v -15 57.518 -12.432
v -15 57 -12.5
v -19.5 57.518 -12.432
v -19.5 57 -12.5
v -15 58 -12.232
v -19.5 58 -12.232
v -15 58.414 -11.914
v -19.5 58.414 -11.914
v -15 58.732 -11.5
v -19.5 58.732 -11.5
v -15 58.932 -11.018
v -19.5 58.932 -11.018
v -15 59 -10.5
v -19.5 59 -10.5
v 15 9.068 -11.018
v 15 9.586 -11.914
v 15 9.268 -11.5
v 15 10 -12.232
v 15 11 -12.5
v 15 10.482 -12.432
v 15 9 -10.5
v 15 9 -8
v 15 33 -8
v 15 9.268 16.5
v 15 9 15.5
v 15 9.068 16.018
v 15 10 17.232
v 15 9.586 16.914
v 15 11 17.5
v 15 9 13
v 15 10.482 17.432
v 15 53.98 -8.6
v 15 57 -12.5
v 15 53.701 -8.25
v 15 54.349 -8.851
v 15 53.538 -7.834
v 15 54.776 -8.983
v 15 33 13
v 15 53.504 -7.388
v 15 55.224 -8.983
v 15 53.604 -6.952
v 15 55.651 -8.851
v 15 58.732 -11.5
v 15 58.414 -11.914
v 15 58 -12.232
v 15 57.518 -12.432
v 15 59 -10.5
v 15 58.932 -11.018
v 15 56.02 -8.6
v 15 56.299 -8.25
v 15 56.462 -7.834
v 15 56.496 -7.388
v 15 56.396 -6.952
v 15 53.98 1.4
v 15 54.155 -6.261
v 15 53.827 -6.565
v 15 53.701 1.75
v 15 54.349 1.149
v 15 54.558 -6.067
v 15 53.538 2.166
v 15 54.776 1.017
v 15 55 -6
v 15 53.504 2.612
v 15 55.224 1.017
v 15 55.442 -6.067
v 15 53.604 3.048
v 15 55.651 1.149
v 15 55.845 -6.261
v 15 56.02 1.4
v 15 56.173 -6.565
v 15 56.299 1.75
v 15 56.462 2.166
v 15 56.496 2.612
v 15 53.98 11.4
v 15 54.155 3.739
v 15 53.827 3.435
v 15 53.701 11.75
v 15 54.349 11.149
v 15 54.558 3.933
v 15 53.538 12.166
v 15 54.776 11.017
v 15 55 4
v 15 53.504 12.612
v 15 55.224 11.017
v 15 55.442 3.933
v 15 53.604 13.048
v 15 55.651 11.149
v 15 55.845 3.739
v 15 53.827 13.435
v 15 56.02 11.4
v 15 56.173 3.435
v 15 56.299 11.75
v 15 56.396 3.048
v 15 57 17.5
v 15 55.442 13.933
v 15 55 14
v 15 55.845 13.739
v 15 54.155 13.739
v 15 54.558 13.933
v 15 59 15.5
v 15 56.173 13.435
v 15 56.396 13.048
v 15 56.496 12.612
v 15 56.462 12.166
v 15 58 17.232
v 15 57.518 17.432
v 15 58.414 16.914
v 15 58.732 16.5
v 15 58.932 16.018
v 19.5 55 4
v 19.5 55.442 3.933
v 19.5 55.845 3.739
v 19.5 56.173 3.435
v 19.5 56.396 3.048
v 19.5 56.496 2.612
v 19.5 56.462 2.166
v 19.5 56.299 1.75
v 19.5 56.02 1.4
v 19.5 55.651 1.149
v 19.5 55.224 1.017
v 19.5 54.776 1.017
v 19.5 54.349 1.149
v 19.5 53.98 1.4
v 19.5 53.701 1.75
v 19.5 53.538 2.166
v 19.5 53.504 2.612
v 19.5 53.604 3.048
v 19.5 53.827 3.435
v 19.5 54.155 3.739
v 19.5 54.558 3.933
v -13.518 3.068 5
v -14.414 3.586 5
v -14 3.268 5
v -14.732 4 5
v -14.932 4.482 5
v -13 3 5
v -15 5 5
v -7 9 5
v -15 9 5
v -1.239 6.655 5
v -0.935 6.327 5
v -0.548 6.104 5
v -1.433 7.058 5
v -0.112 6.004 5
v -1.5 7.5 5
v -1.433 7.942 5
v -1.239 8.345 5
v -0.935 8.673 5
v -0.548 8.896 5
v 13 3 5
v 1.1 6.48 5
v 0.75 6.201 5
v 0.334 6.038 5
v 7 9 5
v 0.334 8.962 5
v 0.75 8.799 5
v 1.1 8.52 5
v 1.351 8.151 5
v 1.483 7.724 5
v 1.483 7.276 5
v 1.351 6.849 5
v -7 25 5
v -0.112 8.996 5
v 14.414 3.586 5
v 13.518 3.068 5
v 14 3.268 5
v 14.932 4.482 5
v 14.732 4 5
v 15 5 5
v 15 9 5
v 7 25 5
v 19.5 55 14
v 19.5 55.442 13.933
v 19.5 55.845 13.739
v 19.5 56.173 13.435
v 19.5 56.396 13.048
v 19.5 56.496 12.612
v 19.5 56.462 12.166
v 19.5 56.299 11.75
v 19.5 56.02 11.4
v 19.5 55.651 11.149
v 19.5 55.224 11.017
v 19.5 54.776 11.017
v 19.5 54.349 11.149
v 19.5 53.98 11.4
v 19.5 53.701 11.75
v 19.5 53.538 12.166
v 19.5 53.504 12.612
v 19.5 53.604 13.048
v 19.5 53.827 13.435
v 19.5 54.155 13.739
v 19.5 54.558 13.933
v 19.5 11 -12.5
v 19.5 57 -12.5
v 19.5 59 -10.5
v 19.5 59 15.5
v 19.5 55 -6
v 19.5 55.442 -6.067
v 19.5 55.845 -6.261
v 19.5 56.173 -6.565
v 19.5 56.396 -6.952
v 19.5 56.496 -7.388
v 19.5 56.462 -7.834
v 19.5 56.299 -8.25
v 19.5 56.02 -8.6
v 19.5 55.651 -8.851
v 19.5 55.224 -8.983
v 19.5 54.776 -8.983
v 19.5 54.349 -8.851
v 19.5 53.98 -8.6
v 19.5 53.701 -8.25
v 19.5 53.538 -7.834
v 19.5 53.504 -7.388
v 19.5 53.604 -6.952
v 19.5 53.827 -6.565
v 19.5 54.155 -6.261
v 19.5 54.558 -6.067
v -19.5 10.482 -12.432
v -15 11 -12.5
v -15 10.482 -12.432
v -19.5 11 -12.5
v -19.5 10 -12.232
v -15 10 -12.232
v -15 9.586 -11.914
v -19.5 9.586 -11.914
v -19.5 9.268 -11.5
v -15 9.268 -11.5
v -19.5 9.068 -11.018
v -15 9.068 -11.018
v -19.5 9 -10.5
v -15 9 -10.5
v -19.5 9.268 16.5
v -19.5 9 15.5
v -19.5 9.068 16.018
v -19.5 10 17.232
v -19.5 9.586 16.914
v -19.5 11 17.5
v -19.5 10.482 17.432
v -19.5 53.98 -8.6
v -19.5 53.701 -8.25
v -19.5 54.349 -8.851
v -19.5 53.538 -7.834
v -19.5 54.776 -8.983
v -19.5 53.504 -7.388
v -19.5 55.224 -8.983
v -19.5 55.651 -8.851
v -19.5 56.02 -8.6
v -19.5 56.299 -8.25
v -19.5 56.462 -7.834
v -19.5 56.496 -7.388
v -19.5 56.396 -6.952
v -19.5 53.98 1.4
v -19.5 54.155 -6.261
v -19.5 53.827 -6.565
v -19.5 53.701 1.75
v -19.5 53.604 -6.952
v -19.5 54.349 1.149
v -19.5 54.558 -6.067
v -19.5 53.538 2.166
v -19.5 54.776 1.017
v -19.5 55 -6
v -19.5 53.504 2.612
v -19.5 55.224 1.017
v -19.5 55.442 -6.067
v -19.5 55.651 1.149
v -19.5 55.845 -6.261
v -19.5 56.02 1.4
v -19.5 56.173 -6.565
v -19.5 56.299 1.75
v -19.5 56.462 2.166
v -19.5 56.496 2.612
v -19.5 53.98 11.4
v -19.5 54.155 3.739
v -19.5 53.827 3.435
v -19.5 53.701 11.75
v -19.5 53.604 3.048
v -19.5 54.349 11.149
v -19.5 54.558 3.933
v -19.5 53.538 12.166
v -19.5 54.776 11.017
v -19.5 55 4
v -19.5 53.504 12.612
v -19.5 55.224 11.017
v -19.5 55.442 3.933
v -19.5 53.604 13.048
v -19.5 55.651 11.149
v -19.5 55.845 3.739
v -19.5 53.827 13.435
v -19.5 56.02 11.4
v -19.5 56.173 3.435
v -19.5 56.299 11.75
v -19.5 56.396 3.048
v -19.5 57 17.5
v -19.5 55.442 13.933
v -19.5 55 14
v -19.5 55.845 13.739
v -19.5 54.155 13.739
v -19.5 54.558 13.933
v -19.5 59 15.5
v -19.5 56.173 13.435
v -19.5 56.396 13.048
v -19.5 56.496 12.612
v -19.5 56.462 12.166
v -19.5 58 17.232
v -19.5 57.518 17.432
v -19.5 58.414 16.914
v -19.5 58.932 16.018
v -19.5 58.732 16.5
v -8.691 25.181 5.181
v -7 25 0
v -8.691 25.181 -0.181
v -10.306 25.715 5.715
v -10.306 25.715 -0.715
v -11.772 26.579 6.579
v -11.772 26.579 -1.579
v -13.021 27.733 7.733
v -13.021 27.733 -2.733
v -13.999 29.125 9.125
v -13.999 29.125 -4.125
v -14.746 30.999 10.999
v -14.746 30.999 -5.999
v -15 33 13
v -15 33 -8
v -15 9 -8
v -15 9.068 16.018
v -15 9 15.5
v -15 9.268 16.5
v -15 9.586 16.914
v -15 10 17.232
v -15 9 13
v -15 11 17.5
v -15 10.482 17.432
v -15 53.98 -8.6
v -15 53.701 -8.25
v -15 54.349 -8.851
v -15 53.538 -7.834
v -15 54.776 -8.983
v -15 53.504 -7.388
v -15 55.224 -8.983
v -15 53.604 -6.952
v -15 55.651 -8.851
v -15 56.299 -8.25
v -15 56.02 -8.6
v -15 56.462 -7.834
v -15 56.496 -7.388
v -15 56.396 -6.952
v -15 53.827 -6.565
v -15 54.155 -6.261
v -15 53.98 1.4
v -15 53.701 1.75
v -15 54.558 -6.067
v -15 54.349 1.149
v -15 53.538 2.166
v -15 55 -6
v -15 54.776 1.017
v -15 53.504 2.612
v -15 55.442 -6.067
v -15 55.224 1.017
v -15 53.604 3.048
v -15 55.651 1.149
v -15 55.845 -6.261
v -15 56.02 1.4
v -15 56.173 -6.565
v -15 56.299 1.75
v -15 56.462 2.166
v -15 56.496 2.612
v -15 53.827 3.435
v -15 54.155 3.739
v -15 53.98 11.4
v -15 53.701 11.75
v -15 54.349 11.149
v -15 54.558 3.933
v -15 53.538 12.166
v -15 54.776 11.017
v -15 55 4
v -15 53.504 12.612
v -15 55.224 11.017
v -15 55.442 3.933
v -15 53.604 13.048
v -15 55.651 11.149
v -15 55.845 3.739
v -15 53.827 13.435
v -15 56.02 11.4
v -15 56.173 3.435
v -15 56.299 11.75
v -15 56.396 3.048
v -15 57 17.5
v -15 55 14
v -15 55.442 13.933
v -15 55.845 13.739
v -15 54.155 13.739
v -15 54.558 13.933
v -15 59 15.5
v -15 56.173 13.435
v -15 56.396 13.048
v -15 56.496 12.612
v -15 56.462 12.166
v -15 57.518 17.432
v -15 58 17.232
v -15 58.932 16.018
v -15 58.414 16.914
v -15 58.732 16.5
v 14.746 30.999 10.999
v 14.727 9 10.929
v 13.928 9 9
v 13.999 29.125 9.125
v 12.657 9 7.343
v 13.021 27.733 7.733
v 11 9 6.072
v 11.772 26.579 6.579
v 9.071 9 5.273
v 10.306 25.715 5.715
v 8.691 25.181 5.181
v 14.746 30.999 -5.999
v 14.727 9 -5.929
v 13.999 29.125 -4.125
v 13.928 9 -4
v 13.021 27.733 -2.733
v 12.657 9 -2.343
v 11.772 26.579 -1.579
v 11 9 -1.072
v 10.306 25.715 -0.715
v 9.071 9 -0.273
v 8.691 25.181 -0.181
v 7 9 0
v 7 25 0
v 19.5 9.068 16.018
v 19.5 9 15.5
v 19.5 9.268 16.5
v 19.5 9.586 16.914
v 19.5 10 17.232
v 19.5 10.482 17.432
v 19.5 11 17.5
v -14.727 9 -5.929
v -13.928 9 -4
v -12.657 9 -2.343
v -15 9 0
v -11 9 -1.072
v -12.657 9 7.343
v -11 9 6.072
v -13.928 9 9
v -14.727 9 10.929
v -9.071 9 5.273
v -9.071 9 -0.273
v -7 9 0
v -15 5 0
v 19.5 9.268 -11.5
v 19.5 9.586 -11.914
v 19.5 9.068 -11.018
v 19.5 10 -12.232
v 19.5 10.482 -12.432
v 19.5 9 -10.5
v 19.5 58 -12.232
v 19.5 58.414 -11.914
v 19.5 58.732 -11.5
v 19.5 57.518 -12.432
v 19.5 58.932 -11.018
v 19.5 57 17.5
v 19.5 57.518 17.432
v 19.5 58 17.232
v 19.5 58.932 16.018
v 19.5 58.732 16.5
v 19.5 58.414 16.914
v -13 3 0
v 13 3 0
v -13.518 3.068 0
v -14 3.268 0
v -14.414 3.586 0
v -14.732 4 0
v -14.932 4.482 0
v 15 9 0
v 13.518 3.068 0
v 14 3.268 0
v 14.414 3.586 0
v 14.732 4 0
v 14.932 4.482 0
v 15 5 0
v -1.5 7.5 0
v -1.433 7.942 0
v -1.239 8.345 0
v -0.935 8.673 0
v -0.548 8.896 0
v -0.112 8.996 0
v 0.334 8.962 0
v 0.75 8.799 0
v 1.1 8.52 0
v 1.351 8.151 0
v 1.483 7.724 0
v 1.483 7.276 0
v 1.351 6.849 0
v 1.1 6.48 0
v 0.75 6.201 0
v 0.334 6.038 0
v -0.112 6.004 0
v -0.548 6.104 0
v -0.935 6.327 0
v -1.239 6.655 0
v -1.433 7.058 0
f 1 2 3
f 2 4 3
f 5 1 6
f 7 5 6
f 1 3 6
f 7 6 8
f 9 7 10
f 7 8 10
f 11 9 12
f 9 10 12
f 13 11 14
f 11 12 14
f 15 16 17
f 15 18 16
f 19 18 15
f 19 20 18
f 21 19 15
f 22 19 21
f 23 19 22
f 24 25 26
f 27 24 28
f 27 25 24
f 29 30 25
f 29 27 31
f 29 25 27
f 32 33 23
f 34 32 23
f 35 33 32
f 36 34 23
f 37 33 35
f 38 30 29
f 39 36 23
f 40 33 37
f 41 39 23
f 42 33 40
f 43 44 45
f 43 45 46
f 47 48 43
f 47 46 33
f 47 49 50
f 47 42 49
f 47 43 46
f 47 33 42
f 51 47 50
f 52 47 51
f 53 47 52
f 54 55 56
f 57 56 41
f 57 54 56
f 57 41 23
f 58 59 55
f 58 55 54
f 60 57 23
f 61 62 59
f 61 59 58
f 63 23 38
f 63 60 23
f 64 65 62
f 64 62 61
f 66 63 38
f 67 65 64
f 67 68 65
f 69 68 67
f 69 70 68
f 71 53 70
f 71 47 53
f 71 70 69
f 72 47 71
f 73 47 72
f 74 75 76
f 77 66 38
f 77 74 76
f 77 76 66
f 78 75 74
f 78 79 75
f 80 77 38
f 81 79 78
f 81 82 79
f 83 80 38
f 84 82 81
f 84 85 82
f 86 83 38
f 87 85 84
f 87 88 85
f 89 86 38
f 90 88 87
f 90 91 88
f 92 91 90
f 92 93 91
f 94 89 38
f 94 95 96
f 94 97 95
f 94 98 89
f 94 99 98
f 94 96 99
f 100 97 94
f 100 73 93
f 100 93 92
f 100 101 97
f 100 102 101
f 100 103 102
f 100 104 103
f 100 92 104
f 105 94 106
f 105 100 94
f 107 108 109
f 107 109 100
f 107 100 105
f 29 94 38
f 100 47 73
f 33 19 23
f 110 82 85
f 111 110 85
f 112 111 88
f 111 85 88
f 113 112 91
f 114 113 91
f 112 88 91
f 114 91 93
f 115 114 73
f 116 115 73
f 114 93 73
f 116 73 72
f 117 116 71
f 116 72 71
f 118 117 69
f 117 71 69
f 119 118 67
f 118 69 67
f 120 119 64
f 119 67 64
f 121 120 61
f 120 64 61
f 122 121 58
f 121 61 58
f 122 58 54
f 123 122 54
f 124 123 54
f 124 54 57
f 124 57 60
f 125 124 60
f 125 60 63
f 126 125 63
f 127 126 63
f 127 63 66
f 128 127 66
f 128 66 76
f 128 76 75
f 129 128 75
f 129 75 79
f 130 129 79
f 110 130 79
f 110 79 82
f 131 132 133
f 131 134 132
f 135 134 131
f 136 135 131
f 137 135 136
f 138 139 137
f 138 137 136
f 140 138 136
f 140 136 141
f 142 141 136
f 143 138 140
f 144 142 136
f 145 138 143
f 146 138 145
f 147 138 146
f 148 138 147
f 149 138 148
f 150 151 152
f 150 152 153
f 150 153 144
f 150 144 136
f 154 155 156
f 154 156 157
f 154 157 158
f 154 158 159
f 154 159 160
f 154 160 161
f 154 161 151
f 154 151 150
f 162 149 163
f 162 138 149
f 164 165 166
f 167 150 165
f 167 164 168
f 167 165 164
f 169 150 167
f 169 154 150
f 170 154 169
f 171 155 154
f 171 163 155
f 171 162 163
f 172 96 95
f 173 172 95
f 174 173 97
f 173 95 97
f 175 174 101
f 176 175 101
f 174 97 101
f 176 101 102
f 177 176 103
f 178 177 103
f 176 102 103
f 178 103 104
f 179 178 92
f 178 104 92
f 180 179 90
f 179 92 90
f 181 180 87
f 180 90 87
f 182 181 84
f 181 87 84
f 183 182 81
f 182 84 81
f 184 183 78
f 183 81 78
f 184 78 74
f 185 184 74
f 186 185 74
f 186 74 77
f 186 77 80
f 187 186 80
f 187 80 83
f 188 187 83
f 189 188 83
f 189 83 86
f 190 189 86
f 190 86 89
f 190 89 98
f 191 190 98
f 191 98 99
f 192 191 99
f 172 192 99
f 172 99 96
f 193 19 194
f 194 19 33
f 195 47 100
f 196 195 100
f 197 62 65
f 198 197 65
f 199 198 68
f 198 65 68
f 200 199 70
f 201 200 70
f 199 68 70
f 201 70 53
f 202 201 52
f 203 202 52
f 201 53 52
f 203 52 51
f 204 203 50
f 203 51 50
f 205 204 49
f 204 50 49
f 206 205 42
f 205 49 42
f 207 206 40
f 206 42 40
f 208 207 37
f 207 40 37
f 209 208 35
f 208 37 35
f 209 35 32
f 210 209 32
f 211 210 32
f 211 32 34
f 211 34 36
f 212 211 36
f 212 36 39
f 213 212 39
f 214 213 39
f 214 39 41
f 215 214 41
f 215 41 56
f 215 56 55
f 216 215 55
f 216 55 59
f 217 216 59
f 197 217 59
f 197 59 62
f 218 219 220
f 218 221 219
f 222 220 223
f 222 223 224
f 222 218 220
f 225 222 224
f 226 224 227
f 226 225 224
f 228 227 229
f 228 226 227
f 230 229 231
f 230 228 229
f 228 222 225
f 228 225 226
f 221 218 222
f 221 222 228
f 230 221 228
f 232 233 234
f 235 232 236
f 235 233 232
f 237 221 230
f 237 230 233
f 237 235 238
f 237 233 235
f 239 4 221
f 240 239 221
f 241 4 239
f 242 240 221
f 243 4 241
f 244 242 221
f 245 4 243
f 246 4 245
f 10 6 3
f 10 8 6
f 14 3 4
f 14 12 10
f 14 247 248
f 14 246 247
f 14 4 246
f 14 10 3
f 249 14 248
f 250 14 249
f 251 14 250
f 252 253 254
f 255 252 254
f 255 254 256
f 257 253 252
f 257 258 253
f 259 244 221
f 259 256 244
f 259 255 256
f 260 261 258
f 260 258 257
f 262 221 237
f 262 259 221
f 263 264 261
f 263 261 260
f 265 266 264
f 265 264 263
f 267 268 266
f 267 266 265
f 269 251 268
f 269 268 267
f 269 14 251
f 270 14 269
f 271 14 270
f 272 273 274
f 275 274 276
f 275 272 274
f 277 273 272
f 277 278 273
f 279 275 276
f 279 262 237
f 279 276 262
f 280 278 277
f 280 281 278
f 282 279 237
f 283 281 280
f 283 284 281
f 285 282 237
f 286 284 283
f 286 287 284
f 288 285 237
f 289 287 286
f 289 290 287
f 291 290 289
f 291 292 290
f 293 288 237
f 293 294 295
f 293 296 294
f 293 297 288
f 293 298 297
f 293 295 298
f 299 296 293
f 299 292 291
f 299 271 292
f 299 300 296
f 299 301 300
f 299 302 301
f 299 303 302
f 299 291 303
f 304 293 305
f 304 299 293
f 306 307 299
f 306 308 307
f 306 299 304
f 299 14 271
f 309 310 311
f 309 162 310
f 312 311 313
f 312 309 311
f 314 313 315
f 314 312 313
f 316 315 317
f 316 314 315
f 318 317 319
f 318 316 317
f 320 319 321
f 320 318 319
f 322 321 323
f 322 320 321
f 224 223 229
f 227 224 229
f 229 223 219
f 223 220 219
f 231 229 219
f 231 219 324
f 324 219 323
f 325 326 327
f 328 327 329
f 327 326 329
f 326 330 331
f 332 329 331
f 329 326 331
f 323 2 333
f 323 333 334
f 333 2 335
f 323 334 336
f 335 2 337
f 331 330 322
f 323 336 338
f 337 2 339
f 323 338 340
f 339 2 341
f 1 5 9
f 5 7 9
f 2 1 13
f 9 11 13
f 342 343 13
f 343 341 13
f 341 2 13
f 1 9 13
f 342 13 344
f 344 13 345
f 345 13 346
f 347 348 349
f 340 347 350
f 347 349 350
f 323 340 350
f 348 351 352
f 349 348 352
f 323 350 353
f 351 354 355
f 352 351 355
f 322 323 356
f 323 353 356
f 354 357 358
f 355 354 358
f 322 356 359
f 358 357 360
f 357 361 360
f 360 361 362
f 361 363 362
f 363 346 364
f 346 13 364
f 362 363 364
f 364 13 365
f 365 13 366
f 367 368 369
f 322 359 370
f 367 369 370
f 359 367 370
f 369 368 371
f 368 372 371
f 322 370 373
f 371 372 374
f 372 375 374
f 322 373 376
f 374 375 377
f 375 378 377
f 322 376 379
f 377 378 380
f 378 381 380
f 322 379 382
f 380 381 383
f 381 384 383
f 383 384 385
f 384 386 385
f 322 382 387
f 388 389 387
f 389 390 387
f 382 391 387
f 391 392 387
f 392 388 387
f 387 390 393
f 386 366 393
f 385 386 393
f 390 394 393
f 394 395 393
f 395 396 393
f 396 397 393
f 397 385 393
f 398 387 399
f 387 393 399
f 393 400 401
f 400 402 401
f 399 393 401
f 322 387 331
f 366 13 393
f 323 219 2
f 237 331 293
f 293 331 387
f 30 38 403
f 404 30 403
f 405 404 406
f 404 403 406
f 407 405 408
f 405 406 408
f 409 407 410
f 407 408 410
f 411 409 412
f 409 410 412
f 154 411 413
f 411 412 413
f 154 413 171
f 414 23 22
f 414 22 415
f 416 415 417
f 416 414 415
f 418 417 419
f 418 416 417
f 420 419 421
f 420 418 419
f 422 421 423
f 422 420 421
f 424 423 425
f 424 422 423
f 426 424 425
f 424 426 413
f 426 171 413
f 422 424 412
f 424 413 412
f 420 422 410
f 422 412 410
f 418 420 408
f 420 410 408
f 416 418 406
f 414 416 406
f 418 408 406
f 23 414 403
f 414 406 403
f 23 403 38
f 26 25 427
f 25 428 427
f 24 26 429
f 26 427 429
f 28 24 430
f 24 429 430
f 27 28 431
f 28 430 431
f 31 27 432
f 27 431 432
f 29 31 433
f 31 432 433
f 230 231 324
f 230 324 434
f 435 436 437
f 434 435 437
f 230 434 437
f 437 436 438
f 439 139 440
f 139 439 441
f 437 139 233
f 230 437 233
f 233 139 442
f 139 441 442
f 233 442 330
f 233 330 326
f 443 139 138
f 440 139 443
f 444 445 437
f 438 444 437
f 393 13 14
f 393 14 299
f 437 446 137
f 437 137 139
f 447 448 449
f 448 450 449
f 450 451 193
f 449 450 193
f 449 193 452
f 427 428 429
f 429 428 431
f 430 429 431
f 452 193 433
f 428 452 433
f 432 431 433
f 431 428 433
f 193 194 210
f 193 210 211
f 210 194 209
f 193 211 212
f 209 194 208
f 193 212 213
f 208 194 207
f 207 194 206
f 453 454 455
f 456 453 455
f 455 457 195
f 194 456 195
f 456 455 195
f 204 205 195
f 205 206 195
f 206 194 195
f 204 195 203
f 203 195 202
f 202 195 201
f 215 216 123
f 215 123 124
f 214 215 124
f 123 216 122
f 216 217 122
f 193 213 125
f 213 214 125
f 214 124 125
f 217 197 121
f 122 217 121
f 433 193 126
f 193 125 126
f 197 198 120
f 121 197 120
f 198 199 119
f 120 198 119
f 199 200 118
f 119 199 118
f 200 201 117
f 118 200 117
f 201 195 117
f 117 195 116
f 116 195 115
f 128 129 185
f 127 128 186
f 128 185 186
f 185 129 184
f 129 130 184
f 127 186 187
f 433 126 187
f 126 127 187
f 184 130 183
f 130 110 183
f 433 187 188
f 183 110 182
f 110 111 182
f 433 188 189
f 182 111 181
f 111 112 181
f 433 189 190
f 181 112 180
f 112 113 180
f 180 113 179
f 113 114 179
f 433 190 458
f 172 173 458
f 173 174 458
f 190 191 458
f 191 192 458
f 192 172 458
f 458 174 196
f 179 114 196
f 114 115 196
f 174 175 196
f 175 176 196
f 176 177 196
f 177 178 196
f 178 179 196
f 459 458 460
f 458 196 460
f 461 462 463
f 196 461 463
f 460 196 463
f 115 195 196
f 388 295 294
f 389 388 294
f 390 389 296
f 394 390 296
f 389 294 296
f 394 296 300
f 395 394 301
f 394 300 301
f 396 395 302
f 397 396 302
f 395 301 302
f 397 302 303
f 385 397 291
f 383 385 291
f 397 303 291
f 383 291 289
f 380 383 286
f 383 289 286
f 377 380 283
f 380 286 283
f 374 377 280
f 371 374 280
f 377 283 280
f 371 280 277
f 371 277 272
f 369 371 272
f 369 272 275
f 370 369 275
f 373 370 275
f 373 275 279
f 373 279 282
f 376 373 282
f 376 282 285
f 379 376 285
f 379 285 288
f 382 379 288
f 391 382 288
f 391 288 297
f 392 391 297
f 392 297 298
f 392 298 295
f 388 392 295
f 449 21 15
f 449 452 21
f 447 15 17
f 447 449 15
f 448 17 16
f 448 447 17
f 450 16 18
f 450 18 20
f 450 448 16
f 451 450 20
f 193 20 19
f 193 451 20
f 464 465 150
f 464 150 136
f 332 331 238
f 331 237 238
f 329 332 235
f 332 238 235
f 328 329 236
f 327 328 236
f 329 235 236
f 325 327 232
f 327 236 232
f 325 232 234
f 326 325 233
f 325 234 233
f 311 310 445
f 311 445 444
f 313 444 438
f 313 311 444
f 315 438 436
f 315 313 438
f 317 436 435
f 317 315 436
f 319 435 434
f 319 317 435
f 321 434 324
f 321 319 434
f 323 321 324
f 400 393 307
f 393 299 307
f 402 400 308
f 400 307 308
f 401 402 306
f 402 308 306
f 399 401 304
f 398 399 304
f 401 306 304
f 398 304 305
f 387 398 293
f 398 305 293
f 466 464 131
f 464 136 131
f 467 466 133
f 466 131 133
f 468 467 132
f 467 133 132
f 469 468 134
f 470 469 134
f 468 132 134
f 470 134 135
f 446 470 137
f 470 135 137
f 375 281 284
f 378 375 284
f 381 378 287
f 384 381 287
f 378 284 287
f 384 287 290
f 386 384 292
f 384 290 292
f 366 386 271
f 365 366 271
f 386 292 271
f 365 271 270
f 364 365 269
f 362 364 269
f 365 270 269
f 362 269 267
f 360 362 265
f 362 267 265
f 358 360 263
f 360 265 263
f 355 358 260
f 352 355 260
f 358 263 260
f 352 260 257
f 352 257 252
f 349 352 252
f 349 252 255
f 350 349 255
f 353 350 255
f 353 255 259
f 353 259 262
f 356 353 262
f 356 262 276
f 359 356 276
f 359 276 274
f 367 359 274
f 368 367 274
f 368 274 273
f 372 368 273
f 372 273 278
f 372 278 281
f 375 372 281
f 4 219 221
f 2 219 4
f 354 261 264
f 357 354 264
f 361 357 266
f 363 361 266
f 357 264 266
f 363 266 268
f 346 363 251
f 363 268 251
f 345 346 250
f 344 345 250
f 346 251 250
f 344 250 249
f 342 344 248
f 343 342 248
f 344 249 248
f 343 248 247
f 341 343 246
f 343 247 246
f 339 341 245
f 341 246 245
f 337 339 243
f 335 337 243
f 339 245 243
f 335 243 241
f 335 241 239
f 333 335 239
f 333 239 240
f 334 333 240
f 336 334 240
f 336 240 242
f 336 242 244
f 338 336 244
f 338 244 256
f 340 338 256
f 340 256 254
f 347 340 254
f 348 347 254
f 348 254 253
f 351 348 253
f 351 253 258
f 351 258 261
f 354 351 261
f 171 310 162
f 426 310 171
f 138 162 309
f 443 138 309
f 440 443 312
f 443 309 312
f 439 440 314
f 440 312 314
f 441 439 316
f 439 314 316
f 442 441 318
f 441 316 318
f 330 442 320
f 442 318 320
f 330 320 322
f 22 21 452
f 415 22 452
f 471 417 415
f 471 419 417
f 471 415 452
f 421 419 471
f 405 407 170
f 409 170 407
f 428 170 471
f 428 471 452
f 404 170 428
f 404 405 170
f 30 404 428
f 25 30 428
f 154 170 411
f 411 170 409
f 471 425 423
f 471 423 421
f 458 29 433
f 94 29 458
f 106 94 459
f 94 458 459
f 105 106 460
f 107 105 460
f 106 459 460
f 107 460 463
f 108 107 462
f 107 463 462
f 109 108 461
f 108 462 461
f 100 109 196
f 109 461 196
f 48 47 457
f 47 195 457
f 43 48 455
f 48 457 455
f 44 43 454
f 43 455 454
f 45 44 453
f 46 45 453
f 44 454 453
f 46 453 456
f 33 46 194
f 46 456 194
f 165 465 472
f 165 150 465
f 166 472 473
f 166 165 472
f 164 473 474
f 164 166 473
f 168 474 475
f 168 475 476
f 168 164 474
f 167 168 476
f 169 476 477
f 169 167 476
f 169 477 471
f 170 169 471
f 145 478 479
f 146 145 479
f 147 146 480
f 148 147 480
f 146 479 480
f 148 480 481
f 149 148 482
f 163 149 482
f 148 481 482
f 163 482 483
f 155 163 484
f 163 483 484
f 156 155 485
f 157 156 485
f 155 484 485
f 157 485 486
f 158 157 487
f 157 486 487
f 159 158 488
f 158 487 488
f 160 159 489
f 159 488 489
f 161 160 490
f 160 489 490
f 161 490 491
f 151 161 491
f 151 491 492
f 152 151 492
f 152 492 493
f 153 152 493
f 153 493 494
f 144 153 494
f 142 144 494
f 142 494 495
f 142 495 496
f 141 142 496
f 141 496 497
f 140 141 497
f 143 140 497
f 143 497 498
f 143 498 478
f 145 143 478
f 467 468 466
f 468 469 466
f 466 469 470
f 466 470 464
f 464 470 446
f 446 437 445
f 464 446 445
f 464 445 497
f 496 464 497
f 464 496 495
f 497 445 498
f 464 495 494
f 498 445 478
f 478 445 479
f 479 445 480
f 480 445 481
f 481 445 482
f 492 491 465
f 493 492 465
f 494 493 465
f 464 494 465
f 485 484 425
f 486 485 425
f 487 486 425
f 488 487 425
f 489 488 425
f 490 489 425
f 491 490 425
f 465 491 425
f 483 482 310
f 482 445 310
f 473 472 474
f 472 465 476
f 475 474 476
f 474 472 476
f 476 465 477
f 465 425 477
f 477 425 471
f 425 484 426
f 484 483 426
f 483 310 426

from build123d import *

# Parameters (mm, degrees)
SKETCH_1_W          = 30
SKETCH_1_H          = 50
EXTRUDE_1_DEPTH     = 5
SKETCH_5_W          = 30
SKETCH_5_H          = 50
EXTRUDE_2_DEPTH     = 4.5
SKETCH_6_R          = 1.5
CUT_EXTRUDE_1_DEPTH = 73.857738093
SKETCH_7_R          = 1.5
CUT_EXTRUDE_2_DEPTH = 73.857738093
SKETCH_10_R         = 1.5
CUT_EXTRUDE_3_DEPTH = 65.556177086
SKETCH_11_W         = 30
SKETCH_11_H         = 28
CUT_EXTRUDE_4_DEPTH = 65.556177086
FILLET_1_R          = 8
FILLET_2_R          = 8
FILLET_3_R          = 2


with BuildPart() as part:
    # 草图1 → 凸台-拉伸1 (new body)
    with BuildSketch(Plane.XY):
        Rectangle(SKETCH_1_W, SKETCH_1_H)
    extrude(amount=EXTRUDE_1_DEPTH)

    # 草图5 → 凸台-拉伸2 (add)
    with BuildSketch(Plane.ZY.offset(15)):
        with Locations((2.5, 34)):
            Rectangle(SKETCH_5_W, SKETCH_5_H)
    extrude_2 = extrude(amount=EXTRUDE_2_DEPTH)

    # 镜向1: 凸台-拉伸2 across plane
    add(extrude_2.mirror(Plane(origin=(0, 0, 0), x_dir=(0, 0, 1), z_dir=(1, 0, 0))))

    # 草图6 → 切除-拉伸1 (cut, through all)
    with BuildSketch(Plane.ZY.offset(19.5)):
        with Locations((2.5, 55)):
            Circle(SKETCH_6_R)
    extrude(amount=-CUT_EXTRUDE_1_DEPTH, mode=Mode.SUBTRACT)

    # 草图7 → 切除-拉伸2 (cut, through all)
    with BuildSketch(Plane.ZY.offset(19.5)):
        with Locations((-7.5, 55)):
            Circle(SKETCH_7_R)
        with Locations((12.5, 55)):
            Circle(SKETCH_7_R)
    extrude(amount=-CUT_EXTRUDE_2_DEPTH, mode=Mode.SUBTRACT)

    # 草图10 → 切除-拉伸3 (cut, through all)
    with BuildSketch(Plane(origin=(0, 0, 0), x_dir=(-1, 0, 0), z_dir=(0, 0, -1))):
        with Locations((0, -13.5)):
            Circle(SKETCH_10_R)
        with Locations((0, 7.5)):
            Circle(SKETCH_10_R)
    extrude(amount=-CUT_EXTRUDE_3_DEPTH, mode=Mode.SUBTRACT)

    # 草图11 → 切除-拉伸4 (cut, through all)
    with BuildSketch(Plane(origin=(0, 0, 0), x_dir=(-1, 0, 0), z_dir=(0, 0, -1))):
        with Locations((0, -11)):
            Rectangle(SKETCH_11_W, SKETCH_11_H)
    extrude(amount=-CUT_EXTRUDE_4_DEPTH, mode=Mode.SUBTRACT)

    # 圆角1
    fillet_1_edges = [part.edges().sort_by_distance(p)[0] for p in [
        (15, 17, 0),
        (15, 17, 5),
        (-15, 17, 5),
        (-15, 17, 0),
    ]]
    fillet(fillet_1_edges, radius=FILLET_1_R)

    # 圆角2
    fillet_2_edges = [part.edges().sort_by_distance(p)[0] for p in [
        (-15, 25, 2.5),
        (15, 25, 2.5),
    ]]
    fillet(fillet_2_edges, radius=FILLET_2_R)

    # 圆角3
    fillet_3_edges = [part.edges().sort_by_distance(p)[0] for p in [
        (-15, 3, 2.5),
        (15, 3, 2.5),
        (-17.25, 59, -12.5),
        (-17.25, 9, -12.5),
        (-17.25, 9, 17.5),
        (-17.25, 59, 17.5),
        (17.25, 9, -12.5),
        (17.25, 59, -12.5),
        (17.25, 59, 17.5),
        (17.25, 9, 17.5),
    ]]
    fillet(fillet_3_edges, radius=FILLET_3_R)


solid = part.part
